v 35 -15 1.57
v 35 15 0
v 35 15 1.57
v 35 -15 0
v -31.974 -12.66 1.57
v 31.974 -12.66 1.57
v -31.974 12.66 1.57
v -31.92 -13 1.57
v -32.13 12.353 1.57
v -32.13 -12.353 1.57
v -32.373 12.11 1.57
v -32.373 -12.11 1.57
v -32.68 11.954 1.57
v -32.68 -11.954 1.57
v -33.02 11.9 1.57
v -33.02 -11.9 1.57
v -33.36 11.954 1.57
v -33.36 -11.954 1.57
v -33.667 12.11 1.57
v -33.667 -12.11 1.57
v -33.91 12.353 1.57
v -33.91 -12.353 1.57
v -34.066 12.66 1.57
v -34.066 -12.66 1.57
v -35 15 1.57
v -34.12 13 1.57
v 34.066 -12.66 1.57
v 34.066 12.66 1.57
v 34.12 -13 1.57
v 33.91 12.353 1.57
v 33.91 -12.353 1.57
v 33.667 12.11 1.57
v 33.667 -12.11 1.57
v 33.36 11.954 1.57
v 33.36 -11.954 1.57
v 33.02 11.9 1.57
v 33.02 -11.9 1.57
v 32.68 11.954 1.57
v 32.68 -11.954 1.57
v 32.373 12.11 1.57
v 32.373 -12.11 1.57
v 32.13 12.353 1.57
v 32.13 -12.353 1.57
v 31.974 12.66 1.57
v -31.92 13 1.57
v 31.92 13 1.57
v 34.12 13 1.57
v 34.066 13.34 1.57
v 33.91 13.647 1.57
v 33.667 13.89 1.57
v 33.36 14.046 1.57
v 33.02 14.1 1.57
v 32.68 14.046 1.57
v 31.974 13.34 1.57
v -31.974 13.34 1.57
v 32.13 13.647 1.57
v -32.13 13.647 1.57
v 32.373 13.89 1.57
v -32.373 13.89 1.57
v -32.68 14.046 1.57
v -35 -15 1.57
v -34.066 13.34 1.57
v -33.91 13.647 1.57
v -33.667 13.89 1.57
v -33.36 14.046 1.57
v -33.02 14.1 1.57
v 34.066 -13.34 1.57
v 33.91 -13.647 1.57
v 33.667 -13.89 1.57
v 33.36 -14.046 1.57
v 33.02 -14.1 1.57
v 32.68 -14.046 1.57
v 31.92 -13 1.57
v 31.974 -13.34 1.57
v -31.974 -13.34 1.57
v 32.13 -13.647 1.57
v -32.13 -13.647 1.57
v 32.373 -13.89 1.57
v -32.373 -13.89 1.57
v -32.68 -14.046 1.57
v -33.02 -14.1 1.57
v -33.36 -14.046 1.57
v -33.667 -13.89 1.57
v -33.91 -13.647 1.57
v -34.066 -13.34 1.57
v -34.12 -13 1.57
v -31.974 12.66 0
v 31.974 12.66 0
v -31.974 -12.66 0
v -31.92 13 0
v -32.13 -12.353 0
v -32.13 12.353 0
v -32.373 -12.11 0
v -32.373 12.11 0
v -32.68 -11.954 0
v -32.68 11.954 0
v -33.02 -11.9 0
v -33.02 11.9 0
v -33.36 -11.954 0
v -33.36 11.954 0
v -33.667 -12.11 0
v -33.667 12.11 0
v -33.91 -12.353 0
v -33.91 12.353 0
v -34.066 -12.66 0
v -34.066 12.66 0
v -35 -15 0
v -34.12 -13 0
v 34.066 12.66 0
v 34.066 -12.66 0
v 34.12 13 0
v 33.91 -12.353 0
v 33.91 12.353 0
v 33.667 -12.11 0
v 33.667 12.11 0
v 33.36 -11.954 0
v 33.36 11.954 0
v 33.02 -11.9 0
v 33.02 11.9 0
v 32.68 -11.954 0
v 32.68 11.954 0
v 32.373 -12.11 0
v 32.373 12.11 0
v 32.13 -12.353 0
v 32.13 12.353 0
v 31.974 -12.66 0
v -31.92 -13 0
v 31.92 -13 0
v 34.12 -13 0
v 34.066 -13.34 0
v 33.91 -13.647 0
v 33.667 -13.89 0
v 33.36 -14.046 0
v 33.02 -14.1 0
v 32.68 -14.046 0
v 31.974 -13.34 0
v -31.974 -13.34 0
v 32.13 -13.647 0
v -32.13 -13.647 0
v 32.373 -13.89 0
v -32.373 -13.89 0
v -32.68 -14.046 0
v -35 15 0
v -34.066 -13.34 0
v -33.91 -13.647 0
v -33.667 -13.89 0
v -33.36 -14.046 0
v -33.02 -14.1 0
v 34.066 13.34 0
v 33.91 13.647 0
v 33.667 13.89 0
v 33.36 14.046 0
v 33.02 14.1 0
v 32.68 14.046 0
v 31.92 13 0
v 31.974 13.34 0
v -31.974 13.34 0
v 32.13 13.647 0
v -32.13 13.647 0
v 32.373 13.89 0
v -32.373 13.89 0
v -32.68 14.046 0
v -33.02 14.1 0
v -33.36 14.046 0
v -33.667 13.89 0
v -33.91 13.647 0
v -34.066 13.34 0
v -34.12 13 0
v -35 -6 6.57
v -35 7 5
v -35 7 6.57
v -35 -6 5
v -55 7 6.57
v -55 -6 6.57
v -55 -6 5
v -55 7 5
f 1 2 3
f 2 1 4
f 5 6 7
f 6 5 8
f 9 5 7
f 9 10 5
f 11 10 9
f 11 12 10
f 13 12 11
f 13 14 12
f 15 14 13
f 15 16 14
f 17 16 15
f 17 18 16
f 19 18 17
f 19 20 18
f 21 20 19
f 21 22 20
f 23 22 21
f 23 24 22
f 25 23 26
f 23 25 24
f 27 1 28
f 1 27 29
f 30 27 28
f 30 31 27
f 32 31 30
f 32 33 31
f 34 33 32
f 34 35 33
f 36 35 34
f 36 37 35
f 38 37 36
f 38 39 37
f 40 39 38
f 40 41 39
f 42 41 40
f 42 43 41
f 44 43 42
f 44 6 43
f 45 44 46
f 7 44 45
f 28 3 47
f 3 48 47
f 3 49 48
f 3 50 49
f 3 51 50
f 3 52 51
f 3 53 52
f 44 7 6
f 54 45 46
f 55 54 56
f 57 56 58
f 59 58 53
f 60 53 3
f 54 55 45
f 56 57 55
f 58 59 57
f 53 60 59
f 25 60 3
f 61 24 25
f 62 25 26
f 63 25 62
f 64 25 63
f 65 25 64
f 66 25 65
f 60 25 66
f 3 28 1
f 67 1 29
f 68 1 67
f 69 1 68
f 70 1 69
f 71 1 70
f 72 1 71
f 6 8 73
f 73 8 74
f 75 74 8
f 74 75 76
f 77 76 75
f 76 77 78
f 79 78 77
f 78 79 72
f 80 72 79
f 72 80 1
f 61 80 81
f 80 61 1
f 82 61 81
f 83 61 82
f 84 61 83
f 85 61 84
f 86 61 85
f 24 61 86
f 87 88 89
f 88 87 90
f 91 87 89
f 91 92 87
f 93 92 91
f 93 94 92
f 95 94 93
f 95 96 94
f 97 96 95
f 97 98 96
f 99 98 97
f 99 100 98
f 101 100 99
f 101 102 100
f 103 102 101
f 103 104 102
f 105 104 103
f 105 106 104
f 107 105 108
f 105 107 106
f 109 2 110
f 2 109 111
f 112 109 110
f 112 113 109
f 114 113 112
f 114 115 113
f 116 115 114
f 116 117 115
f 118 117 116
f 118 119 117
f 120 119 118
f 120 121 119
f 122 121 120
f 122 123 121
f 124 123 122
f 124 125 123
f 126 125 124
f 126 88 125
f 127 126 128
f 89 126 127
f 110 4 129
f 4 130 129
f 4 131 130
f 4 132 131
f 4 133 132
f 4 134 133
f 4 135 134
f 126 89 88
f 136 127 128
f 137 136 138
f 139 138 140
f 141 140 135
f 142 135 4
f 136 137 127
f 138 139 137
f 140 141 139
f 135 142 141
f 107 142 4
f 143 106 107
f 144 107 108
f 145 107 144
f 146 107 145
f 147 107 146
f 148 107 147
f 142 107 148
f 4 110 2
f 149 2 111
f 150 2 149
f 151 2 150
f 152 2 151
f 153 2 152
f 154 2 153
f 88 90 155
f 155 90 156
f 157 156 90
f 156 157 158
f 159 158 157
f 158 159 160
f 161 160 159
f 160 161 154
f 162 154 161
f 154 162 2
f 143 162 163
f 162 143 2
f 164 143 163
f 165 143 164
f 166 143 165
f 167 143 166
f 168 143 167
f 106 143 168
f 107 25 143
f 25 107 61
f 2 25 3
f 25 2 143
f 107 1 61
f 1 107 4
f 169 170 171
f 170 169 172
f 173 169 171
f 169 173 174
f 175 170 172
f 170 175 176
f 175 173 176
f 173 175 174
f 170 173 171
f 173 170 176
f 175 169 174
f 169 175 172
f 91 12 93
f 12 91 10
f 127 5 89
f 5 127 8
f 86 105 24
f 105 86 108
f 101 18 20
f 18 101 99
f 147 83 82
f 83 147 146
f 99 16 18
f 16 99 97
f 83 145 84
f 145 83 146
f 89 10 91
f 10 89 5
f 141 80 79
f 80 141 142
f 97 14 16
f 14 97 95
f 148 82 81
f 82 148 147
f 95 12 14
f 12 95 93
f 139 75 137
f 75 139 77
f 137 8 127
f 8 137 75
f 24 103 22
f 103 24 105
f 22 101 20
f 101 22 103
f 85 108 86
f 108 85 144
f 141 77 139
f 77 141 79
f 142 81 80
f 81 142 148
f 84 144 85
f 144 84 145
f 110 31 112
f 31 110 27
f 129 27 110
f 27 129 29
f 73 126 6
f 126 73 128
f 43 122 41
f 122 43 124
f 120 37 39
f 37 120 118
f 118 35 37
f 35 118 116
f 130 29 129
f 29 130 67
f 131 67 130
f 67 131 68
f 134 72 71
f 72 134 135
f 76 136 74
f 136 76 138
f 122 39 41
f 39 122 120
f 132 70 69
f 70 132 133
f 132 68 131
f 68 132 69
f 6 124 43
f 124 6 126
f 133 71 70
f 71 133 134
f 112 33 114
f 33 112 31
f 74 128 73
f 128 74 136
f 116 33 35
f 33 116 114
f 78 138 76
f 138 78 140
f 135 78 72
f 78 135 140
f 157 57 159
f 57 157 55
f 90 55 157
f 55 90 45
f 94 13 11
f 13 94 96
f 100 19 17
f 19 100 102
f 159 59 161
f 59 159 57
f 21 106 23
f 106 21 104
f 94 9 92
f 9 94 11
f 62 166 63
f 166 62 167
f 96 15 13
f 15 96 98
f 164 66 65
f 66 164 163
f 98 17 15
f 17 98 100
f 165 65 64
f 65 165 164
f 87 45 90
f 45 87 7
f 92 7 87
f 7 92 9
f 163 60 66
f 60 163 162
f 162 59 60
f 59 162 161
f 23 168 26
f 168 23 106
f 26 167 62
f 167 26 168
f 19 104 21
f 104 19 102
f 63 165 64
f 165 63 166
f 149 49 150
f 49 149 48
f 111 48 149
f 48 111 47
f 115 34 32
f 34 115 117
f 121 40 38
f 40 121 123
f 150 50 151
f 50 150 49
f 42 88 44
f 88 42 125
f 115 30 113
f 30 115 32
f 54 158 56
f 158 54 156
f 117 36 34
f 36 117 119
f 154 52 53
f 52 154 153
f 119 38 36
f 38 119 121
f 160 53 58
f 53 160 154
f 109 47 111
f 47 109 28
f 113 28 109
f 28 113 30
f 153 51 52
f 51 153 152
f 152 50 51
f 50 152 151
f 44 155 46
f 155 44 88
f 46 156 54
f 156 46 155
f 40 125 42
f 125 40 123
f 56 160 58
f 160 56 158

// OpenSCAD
// file: ../utils/struct.scad
function get(config, key) = config[search([key], config)[0]][1];

function set(config, key, value) = [for (elem = config) if (elem[0] != key) elem, [key, value]];
    
function join(config1, config2) = [for (elem = config1) elem, for (elem = config2) elem];
// main file
use <../utils/struct.scad>

function PowerBoard_config() =
        let (
            pcb_height = 1.57,
            width = 70,
            height = 30,
            bore_diameter = 2.2,
            bore_spread_w = 26*2.54,
            bore_spread_h = 26
        ) [
            ["pcb_height", pcb_height],
            ["width", width],
            ["height", height],
            ["bore_diameter", bore_diameter],
            ["bore_spread_w", bore_spread_w],
            ["bore_spread_h", bore_spread_h]
        ];


module PowerBoard_BoreHoles(config, front = true, back = true) {
    bore_spread_w = get(config, "bore_spread_w");
    bore_spread_h = get(config, "bore_spread_h");
    
    for (i = [-1, 1])
        if (((i == -1) && front) ||
            ((i == 1) && back))
        for (j = [-1, 1])
        translate([
                j*bore_spread_w/2, 
                i*bore_spread_h/2,
                0])
        children();
}

module PowerBoard(config) {
    width = get(config, "width");
    height = get(config, "height");
    bore_spread_w = get(config, "bore_spread_w");
    bore_spread_h = get(config, "bore_spread_h");
    pcb_height = get(config, "pcb_height");
    
    difference() {
        union() {
            translate([-width/2, -height/2, 0])
            cube([width, height, pcb_height]);

            translate([-width/2-20, -6, 5])
            cube([20, 13, pcb_height]);
        }

        
        translate([0, 0, -1])
        PowerBoard_BoreHoles(config)
        cylinder($fn=20, d = get(config, "bore_diameter"), h = 10);
            
        if (false)
            for (r = [0:9])
                for (c = [0:23])
                    translate([(c-11.5)*2.54, (r-4.5)*2.54, -1])
                    cylinder($fn=10, d = 0.5, h = 5);
    }
    
};

PowerBoard(PowerBoard_config());

module AlignPowerBoardToMainBoard(config) {
    pcb_height = get(config, "pcb_height");

    translate([0, -4.5*2.54-8.5*2.54, 11+pcb_height])
    children();
}
